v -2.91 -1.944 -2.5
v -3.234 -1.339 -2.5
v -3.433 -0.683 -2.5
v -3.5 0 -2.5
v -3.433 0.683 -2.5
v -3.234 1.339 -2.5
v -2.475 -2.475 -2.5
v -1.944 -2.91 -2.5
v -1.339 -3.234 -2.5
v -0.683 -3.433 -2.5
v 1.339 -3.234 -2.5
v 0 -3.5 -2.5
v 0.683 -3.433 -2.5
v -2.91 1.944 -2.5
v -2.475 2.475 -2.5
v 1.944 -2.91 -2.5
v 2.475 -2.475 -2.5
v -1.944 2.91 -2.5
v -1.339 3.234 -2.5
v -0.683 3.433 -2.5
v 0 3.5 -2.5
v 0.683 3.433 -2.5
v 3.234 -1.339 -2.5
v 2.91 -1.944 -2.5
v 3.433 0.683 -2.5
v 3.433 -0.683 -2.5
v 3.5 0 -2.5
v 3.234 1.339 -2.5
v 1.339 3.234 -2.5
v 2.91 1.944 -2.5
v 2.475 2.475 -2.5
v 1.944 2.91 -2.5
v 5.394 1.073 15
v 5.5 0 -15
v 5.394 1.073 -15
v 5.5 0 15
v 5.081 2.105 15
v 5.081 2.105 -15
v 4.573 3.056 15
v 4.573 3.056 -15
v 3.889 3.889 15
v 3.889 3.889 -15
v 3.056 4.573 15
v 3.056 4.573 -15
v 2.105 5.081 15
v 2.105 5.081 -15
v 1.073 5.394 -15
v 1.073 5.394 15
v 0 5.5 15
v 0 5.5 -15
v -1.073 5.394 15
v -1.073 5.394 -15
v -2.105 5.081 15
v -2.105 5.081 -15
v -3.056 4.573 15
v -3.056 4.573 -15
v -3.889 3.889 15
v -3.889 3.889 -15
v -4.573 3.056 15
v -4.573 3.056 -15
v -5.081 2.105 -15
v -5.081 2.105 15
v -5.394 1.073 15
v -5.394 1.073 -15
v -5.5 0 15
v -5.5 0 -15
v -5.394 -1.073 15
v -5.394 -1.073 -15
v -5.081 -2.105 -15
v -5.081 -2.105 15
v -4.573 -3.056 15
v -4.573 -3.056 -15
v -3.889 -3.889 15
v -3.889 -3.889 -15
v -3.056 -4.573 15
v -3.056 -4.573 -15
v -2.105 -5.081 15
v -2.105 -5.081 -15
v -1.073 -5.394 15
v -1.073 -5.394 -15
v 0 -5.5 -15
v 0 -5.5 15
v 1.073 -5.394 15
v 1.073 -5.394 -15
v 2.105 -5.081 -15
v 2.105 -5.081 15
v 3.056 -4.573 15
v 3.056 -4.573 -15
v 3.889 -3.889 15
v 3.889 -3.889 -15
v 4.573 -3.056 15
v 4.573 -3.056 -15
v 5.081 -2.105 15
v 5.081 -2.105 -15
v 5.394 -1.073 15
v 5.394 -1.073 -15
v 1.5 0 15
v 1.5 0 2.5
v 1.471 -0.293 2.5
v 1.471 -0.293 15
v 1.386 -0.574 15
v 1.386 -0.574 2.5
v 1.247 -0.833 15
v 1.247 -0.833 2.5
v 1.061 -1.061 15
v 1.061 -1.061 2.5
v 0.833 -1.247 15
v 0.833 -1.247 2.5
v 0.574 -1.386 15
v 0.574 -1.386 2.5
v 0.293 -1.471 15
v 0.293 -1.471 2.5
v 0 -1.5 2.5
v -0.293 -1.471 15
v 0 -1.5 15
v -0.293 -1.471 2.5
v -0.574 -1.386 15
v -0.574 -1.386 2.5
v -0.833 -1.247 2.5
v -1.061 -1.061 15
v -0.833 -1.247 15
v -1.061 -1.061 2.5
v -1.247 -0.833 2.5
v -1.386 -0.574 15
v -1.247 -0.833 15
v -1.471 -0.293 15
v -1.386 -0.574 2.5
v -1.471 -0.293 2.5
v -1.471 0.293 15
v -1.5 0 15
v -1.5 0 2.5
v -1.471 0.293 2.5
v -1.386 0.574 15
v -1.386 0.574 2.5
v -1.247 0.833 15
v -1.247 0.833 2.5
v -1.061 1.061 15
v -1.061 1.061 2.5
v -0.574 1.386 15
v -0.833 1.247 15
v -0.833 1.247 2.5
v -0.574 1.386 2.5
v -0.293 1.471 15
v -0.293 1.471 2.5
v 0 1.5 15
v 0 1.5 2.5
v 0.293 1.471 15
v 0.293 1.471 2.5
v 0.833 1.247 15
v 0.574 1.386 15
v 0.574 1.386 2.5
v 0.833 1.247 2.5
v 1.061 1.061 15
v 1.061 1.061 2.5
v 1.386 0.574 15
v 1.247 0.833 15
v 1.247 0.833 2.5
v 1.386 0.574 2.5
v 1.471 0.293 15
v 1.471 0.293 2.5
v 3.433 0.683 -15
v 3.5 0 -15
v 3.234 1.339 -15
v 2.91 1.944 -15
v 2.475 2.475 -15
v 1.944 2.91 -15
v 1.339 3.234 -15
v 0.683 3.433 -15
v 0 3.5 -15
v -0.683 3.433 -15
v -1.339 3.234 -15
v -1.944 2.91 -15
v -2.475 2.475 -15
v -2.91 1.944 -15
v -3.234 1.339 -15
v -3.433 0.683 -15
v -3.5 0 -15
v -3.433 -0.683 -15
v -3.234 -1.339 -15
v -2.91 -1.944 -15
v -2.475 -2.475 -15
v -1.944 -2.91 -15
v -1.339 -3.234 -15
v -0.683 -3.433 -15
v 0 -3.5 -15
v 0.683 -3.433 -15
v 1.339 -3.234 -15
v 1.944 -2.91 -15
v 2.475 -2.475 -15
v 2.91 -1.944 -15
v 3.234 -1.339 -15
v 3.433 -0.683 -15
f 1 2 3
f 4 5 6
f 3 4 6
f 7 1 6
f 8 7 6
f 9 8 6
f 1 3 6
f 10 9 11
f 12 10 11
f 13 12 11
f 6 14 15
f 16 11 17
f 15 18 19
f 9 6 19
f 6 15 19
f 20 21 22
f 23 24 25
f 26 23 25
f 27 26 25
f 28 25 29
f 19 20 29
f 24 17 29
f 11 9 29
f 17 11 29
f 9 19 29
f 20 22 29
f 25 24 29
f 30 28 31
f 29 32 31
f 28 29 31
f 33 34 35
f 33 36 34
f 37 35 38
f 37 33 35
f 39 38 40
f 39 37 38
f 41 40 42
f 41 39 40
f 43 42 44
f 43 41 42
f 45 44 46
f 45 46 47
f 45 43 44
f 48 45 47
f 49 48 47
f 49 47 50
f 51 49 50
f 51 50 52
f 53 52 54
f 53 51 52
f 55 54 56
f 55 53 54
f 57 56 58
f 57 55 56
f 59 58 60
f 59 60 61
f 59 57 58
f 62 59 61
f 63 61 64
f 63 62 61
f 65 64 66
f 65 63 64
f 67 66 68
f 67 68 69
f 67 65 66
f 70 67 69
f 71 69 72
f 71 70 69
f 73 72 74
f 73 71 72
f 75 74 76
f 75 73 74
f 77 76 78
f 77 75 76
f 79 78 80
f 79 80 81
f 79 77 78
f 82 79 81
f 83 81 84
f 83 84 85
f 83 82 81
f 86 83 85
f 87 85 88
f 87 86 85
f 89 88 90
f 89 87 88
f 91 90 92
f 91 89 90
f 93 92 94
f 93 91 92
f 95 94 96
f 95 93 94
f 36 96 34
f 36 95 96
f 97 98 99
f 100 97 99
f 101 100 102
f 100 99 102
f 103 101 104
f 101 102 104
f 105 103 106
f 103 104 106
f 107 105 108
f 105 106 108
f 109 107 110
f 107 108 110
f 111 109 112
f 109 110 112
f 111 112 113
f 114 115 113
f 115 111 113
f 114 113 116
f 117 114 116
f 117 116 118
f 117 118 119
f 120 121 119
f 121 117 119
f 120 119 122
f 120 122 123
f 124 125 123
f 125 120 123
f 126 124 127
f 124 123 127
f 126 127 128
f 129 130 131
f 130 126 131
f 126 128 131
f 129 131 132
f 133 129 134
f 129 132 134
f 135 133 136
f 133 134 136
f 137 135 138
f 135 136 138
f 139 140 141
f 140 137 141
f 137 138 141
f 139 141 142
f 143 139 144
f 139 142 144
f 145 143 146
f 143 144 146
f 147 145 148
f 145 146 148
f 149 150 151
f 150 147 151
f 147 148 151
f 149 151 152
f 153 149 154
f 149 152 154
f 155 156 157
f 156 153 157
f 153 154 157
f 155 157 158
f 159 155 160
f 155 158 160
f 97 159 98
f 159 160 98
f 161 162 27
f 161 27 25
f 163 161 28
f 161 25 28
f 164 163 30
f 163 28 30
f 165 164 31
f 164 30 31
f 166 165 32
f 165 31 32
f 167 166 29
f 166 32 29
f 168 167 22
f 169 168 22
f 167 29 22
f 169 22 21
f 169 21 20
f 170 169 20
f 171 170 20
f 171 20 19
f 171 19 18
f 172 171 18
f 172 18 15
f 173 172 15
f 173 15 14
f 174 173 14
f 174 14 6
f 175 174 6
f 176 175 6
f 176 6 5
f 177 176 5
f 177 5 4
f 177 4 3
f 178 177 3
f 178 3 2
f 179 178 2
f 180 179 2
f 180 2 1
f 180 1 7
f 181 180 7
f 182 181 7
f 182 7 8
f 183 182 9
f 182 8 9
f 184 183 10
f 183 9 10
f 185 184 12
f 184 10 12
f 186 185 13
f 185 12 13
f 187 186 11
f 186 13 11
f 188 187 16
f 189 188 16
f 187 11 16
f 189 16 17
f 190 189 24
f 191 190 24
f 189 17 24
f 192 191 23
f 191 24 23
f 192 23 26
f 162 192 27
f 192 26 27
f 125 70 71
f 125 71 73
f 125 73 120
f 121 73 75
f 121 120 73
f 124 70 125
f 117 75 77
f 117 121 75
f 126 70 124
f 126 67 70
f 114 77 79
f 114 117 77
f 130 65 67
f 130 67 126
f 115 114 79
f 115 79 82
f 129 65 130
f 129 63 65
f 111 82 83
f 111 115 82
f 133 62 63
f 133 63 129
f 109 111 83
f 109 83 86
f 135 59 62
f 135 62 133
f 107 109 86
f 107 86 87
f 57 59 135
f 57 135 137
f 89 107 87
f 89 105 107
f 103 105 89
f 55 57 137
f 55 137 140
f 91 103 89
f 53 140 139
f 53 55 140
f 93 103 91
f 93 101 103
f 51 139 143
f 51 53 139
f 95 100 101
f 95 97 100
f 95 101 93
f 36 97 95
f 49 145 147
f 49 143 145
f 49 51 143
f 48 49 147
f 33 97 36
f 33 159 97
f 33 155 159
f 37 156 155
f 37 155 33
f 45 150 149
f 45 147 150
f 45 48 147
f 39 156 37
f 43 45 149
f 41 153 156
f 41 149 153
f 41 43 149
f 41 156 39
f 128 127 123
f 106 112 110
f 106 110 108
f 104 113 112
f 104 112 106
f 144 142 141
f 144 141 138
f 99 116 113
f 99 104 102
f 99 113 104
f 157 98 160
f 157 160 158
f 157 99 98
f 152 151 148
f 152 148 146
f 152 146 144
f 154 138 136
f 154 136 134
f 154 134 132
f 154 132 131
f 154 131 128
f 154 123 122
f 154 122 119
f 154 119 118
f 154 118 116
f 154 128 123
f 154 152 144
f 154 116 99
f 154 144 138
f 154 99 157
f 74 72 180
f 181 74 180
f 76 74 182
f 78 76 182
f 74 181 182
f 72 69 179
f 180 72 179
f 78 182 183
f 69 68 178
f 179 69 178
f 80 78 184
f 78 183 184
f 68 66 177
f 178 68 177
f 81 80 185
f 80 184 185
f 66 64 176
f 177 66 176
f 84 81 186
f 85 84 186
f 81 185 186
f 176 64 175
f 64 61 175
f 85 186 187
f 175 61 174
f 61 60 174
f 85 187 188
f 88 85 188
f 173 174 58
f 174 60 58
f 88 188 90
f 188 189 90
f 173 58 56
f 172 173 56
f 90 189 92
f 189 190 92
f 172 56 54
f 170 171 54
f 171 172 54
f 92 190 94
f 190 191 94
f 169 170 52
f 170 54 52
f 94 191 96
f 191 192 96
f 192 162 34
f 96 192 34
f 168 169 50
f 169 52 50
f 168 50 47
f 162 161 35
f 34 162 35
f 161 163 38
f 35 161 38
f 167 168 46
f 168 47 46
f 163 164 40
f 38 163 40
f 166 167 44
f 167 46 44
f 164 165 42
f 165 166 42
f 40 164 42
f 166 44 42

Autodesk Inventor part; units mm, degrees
ref_plane "YZ Plane" through (0, 0, 0) normal (1, 0, 0) x (0, 1, 0)
ref_plane "XZ Plane" through (0, 0, 0) normal (0, 1, 0) x (-1, 0, 0)
ref_plane "XY Plane" through (0, 0, 0) normal (0, 0, 1) x (1, 0, 0)
sketch "Sketch1" plane through (0, 0, 0) normal (0, 0, 1) x (1, 0, 0)
  circle A0 centre (0, 0) radius 1.5
  circle A1 centre (0, 0) radius 5.5
  circle A2 centre (0, 0) radius 3.5
  dimension "d0" = 3
  dimension "d1" = 11
  dimension "d2" = 7
extrude "Extrusion1" add sketch "Sketch1" along normal mid plane 30 contours A1
extrude "Extrusion2" add sketch "Sketch1" along normal blind 15 contours A2
extrude "Extrusion3" add sketch "Sketch1" along normal mid plane 5 contours A0
extrude "Extrusion4" add sketch "Sketch1" against normal blind 2.5 contours A2
properties part number "Shaft Coupler"
